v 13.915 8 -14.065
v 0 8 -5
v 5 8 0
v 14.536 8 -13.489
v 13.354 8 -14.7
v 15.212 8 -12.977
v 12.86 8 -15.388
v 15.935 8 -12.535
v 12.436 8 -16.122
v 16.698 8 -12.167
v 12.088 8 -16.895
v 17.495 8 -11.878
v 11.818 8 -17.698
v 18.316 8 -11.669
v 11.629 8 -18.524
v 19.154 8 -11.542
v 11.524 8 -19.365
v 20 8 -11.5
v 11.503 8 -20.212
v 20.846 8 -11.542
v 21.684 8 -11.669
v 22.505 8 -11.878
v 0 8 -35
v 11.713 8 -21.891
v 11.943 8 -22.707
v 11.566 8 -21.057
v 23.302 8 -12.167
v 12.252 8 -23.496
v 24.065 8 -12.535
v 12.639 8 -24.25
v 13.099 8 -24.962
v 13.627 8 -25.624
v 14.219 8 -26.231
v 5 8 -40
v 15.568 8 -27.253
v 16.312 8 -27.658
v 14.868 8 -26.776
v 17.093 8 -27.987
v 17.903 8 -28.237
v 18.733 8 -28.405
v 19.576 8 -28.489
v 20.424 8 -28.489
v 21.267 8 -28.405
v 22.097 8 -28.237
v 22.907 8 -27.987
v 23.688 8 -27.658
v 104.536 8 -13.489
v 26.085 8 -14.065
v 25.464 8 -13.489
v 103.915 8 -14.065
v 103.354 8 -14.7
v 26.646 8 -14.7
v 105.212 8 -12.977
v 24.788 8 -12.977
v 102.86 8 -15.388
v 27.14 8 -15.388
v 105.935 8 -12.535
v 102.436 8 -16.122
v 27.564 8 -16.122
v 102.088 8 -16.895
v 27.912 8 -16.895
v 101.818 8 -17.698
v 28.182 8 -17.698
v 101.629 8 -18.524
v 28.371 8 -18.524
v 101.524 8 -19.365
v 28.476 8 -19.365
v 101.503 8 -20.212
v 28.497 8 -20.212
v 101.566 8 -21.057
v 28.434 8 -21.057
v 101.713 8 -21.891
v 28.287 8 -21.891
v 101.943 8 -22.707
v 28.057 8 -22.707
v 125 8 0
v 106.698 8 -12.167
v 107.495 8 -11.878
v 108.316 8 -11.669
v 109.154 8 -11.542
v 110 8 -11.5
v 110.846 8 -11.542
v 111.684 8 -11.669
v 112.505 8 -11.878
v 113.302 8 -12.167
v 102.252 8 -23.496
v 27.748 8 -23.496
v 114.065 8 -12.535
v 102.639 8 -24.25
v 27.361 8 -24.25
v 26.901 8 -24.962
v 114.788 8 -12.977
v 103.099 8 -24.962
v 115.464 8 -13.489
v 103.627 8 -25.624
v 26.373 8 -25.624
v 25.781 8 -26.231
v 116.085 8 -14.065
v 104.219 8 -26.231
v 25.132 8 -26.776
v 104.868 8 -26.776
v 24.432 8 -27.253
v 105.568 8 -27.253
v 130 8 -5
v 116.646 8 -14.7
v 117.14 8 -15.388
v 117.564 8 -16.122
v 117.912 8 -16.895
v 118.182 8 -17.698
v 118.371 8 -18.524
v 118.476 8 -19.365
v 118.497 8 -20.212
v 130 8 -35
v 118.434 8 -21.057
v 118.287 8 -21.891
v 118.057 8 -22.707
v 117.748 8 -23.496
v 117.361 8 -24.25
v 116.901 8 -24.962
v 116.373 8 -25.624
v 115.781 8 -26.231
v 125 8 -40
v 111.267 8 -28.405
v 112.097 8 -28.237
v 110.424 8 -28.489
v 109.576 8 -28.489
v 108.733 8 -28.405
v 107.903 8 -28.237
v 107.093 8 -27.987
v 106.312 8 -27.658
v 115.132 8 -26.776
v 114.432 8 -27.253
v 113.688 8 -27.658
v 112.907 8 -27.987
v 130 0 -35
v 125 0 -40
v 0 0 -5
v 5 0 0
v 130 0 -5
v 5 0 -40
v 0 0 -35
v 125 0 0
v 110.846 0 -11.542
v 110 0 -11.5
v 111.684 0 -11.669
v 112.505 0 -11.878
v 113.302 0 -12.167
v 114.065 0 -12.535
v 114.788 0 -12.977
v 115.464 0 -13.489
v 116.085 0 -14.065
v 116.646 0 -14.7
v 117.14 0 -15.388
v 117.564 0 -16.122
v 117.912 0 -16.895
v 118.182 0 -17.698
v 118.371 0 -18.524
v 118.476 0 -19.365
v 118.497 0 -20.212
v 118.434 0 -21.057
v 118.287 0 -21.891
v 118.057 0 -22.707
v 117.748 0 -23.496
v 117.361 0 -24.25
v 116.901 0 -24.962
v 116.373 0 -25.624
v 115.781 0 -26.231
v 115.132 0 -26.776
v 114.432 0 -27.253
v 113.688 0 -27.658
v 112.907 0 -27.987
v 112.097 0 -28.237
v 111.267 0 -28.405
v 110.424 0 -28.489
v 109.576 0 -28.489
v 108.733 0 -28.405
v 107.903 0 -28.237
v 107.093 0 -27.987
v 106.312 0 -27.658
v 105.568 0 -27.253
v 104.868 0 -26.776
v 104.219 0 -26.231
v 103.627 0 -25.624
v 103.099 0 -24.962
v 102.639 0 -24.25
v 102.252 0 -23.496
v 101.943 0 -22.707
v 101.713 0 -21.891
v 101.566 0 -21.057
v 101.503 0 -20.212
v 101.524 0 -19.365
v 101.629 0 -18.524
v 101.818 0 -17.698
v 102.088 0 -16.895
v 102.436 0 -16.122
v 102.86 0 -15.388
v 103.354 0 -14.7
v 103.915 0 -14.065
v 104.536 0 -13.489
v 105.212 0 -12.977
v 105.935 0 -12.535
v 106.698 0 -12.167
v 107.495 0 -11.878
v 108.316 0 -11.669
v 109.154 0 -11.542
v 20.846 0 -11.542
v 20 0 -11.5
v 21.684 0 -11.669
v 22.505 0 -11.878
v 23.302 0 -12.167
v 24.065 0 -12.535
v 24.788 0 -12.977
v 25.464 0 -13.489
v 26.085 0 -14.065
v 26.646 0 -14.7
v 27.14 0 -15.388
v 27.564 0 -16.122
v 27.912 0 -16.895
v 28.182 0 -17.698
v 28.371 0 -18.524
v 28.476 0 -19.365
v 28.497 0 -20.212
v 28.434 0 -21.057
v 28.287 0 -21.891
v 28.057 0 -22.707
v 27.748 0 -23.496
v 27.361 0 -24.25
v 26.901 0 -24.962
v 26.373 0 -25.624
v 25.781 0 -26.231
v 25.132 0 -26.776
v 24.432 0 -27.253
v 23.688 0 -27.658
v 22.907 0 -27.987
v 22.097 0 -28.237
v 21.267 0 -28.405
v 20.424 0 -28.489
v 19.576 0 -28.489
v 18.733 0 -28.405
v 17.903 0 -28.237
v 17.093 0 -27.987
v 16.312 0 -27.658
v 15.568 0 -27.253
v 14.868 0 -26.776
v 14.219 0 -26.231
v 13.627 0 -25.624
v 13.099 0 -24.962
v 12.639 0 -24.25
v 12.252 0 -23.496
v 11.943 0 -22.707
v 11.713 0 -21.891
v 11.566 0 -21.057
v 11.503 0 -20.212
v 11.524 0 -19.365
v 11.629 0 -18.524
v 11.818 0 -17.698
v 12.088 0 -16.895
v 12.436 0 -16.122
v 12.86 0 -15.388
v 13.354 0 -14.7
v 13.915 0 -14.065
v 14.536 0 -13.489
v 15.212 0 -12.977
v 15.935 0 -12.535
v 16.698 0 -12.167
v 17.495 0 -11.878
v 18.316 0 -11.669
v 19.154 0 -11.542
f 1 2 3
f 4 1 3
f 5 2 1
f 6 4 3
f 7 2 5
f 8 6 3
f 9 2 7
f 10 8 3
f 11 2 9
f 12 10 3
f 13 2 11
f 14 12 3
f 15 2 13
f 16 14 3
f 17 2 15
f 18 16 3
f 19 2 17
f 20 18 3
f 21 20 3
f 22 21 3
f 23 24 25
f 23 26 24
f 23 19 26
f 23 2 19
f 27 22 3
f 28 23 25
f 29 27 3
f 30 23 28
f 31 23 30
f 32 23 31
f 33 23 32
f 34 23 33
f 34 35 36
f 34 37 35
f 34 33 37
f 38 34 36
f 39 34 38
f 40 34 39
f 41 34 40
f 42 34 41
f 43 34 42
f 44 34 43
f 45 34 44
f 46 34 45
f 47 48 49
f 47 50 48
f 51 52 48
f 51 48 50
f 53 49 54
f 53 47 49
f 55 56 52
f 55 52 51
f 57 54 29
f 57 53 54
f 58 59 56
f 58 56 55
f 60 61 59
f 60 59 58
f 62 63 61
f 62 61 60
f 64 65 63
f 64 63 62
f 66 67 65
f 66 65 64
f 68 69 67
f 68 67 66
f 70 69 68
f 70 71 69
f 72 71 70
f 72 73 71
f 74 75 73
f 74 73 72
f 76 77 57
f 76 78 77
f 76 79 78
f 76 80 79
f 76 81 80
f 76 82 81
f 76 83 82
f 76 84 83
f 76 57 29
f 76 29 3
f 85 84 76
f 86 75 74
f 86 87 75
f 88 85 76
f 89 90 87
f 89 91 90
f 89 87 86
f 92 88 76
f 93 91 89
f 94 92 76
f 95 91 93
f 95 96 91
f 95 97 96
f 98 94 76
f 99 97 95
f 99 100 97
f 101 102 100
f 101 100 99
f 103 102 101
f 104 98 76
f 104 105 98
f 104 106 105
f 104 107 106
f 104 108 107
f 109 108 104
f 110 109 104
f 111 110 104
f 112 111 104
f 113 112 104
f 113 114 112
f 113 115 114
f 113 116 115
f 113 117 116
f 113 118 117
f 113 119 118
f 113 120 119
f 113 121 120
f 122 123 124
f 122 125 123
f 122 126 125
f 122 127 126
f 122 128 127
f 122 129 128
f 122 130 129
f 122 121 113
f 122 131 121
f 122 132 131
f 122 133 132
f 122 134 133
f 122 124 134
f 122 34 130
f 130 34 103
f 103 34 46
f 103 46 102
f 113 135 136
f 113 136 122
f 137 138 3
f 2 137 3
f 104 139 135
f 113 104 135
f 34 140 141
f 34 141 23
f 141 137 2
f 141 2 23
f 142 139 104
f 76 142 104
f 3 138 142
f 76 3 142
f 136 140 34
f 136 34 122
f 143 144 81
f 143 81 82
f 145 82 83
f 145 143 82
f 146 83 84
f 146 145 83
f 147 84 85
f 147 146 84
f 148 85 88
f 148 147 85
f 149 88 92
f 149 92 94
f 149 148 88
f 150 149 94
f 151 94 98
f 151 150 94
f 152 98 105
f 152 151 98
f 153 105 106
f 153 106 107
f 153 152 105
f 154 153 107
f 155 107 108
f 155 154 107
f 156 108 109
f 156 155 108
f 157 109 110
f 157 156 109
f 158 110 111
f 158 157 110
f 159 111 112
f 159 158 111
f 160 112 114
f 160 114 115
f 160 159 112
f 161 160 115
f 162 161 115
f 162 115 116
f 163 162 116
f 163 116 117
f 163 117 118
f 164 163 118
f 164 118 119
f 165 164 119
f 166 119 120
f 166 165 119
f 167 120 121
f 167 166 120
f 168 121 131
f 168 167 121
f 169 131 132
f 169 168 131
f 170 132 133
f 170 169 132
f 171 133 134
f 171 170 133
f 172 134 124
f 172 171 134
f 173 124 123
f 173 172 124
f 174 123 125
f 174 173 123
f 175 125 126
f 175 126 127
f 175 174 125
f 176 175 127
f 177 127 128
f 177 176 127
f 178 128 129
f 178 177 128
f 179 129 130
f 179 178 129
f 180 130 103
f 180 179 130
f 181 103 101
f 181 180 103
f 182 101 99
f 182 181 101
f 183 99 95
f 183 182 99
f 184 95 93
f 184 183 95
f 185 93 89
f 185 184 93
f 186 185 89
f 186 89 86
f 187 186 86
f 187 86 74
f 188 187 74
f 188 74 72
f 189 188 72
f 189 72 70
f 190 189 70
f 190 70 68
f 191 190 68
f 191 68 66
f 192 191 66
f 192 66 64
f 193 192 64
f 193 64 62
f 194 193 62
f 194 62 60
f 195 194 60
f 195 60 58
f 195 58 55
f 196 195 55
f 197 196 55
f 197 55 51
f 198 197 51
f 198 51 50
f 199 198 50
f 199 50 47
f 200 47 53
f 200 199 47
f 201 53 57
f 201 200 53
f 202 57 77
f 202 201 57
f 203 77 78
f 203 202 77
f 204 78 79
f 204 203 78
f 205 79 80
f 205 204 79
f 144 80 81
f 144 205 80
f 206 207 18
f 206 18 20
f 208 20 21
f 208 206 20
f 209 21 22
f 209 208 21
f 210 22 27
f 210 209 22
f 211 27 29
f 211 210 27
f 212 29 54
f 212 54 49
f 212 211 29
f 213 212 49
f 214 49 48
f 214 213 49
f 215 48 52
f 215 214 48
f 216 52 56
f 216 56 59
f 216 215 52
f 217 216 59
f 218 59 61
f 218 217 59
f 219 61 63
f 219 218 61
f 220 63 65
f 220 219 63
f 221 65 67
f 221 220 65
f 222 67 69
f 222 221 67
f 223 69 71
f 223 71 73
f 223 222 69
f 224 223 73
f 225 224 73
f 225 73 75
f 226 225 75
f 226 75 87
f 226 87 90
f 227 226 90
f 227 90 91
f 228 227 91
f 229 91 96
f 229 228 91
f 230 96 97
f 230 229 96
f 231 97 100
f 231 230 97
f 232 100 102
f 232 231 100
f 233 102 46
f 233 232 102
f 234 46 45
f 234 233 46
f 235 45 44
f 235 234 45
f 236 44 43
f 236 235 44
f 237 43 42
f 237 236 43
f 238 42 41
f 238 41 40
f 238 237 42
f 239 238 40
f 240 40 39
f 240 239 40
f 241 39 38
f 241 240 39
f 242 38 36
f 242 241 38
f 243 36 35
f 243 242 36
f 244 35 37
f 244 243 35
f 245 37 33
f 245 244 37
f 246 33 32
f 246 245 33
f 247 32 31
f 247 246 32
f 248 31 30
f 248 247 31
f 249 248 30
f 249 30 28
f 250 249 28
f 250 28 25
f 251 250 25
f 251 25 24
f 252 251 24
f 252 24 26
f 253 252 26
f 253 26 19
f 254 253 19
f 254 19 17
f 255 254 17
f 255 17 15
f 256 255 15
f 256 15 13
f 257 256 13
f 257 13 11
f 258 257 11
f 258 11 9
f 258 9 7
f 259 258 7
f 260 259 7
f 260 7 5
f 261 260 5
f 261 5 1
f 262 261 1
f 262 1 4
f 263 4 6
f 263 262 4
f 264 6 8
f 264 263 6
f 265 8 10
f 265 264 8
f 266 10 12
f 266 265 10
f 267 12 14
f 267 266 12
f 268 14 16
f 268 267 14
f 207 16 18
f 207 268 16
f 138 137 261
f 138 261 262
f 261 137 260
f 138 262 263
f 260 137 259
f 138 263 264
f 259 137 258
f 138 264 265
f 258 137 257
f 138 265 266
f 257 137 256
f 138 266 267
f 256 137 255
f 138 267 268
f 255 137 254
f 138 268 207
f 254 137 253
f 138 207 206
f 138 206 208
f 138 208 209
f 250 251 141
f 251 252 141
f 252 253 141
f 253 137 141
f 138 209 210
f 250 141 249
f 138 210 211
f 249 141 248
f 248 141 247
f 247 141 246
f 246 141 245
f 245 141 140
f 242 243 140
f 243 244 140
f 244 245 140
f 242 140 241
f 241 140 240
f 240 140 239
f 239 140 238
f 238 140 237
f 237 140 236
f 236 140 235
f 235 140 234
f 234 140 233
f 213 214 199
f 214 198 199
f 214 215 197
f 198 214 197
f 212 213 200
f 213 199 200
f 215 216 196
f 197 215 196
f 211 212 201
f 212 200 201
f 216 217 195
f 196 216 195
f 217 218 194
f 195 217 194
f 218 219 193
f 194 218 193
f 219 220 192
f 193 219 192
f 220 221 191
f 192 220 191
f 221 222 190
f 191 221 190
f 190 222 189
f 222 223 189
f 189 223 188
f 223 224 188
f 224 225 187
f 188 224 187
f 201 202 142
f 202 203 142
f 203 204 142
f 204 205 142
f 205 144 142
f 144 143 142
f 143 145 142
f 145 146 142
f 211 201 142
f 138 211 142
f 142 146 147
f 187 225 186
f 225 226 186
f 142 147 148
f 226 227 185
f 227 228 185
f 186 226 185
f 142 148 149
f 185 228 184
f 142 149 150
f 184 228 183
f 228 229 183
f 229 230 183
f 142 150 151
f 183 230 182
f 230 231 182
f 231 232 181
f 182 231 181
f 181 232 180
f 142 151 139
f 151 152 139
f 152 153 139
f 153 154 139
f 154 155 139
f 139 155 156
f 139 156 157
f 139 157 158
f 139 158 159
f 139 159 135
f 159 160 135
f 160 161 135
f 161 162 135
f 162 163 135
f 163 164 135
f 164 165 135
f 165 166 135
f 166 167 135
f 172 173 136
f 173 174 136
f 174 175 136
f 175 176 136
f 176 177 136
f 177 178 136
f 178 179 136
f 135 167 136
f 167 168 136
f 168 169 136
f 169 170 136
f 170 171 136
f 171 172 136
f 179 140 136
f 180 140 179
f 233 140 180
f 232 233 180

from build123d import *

# Parameters (mm, degrees)
SKETCH_1_W      = 130
SKETCH_1_H      = 40
SKETCH_1_R      = 8.5
EXTRUDE_1_DEPTH = 8
CHAMFER_1_SIZE  = 5


with BuildPart() as part:
    # 草图1 → 凸台-拉伸1 (new body)
    with BuildSketch(Plane(origin=(0, 0, 0), x_dir=(1, 0, 0), z_dir=(0, 1, 0))):
        with Locations((65, 20)):
            Rectangle(SKETCH_1_W, SKETCH_1_H)
        with Locations(Location((20, 20, 0), (0, 0, 270))):
            Circle(SKETCH_1_R, mode=Mode.SUBTRACT)
        with Locations(Location((110, 20, 0), (0, 0, 270))):
            Circle(SKETCH_1_R, mode=Mode.SUBTRACT)
    extrude(amount=EXTRUDE_1_DEPTH)

    # 倒角1
    chamfer_1_edges = [part.edges().sort_by_distance(p)[0] for p in [
        (0, 4, -40),
        (130, 4, -40),
        (130, 4, 0),
        (0, 4, 0),
    ]]
    chamfer(chamfer_1_edges, length=CHAMFER_1_SIZE)


solid = part.part
